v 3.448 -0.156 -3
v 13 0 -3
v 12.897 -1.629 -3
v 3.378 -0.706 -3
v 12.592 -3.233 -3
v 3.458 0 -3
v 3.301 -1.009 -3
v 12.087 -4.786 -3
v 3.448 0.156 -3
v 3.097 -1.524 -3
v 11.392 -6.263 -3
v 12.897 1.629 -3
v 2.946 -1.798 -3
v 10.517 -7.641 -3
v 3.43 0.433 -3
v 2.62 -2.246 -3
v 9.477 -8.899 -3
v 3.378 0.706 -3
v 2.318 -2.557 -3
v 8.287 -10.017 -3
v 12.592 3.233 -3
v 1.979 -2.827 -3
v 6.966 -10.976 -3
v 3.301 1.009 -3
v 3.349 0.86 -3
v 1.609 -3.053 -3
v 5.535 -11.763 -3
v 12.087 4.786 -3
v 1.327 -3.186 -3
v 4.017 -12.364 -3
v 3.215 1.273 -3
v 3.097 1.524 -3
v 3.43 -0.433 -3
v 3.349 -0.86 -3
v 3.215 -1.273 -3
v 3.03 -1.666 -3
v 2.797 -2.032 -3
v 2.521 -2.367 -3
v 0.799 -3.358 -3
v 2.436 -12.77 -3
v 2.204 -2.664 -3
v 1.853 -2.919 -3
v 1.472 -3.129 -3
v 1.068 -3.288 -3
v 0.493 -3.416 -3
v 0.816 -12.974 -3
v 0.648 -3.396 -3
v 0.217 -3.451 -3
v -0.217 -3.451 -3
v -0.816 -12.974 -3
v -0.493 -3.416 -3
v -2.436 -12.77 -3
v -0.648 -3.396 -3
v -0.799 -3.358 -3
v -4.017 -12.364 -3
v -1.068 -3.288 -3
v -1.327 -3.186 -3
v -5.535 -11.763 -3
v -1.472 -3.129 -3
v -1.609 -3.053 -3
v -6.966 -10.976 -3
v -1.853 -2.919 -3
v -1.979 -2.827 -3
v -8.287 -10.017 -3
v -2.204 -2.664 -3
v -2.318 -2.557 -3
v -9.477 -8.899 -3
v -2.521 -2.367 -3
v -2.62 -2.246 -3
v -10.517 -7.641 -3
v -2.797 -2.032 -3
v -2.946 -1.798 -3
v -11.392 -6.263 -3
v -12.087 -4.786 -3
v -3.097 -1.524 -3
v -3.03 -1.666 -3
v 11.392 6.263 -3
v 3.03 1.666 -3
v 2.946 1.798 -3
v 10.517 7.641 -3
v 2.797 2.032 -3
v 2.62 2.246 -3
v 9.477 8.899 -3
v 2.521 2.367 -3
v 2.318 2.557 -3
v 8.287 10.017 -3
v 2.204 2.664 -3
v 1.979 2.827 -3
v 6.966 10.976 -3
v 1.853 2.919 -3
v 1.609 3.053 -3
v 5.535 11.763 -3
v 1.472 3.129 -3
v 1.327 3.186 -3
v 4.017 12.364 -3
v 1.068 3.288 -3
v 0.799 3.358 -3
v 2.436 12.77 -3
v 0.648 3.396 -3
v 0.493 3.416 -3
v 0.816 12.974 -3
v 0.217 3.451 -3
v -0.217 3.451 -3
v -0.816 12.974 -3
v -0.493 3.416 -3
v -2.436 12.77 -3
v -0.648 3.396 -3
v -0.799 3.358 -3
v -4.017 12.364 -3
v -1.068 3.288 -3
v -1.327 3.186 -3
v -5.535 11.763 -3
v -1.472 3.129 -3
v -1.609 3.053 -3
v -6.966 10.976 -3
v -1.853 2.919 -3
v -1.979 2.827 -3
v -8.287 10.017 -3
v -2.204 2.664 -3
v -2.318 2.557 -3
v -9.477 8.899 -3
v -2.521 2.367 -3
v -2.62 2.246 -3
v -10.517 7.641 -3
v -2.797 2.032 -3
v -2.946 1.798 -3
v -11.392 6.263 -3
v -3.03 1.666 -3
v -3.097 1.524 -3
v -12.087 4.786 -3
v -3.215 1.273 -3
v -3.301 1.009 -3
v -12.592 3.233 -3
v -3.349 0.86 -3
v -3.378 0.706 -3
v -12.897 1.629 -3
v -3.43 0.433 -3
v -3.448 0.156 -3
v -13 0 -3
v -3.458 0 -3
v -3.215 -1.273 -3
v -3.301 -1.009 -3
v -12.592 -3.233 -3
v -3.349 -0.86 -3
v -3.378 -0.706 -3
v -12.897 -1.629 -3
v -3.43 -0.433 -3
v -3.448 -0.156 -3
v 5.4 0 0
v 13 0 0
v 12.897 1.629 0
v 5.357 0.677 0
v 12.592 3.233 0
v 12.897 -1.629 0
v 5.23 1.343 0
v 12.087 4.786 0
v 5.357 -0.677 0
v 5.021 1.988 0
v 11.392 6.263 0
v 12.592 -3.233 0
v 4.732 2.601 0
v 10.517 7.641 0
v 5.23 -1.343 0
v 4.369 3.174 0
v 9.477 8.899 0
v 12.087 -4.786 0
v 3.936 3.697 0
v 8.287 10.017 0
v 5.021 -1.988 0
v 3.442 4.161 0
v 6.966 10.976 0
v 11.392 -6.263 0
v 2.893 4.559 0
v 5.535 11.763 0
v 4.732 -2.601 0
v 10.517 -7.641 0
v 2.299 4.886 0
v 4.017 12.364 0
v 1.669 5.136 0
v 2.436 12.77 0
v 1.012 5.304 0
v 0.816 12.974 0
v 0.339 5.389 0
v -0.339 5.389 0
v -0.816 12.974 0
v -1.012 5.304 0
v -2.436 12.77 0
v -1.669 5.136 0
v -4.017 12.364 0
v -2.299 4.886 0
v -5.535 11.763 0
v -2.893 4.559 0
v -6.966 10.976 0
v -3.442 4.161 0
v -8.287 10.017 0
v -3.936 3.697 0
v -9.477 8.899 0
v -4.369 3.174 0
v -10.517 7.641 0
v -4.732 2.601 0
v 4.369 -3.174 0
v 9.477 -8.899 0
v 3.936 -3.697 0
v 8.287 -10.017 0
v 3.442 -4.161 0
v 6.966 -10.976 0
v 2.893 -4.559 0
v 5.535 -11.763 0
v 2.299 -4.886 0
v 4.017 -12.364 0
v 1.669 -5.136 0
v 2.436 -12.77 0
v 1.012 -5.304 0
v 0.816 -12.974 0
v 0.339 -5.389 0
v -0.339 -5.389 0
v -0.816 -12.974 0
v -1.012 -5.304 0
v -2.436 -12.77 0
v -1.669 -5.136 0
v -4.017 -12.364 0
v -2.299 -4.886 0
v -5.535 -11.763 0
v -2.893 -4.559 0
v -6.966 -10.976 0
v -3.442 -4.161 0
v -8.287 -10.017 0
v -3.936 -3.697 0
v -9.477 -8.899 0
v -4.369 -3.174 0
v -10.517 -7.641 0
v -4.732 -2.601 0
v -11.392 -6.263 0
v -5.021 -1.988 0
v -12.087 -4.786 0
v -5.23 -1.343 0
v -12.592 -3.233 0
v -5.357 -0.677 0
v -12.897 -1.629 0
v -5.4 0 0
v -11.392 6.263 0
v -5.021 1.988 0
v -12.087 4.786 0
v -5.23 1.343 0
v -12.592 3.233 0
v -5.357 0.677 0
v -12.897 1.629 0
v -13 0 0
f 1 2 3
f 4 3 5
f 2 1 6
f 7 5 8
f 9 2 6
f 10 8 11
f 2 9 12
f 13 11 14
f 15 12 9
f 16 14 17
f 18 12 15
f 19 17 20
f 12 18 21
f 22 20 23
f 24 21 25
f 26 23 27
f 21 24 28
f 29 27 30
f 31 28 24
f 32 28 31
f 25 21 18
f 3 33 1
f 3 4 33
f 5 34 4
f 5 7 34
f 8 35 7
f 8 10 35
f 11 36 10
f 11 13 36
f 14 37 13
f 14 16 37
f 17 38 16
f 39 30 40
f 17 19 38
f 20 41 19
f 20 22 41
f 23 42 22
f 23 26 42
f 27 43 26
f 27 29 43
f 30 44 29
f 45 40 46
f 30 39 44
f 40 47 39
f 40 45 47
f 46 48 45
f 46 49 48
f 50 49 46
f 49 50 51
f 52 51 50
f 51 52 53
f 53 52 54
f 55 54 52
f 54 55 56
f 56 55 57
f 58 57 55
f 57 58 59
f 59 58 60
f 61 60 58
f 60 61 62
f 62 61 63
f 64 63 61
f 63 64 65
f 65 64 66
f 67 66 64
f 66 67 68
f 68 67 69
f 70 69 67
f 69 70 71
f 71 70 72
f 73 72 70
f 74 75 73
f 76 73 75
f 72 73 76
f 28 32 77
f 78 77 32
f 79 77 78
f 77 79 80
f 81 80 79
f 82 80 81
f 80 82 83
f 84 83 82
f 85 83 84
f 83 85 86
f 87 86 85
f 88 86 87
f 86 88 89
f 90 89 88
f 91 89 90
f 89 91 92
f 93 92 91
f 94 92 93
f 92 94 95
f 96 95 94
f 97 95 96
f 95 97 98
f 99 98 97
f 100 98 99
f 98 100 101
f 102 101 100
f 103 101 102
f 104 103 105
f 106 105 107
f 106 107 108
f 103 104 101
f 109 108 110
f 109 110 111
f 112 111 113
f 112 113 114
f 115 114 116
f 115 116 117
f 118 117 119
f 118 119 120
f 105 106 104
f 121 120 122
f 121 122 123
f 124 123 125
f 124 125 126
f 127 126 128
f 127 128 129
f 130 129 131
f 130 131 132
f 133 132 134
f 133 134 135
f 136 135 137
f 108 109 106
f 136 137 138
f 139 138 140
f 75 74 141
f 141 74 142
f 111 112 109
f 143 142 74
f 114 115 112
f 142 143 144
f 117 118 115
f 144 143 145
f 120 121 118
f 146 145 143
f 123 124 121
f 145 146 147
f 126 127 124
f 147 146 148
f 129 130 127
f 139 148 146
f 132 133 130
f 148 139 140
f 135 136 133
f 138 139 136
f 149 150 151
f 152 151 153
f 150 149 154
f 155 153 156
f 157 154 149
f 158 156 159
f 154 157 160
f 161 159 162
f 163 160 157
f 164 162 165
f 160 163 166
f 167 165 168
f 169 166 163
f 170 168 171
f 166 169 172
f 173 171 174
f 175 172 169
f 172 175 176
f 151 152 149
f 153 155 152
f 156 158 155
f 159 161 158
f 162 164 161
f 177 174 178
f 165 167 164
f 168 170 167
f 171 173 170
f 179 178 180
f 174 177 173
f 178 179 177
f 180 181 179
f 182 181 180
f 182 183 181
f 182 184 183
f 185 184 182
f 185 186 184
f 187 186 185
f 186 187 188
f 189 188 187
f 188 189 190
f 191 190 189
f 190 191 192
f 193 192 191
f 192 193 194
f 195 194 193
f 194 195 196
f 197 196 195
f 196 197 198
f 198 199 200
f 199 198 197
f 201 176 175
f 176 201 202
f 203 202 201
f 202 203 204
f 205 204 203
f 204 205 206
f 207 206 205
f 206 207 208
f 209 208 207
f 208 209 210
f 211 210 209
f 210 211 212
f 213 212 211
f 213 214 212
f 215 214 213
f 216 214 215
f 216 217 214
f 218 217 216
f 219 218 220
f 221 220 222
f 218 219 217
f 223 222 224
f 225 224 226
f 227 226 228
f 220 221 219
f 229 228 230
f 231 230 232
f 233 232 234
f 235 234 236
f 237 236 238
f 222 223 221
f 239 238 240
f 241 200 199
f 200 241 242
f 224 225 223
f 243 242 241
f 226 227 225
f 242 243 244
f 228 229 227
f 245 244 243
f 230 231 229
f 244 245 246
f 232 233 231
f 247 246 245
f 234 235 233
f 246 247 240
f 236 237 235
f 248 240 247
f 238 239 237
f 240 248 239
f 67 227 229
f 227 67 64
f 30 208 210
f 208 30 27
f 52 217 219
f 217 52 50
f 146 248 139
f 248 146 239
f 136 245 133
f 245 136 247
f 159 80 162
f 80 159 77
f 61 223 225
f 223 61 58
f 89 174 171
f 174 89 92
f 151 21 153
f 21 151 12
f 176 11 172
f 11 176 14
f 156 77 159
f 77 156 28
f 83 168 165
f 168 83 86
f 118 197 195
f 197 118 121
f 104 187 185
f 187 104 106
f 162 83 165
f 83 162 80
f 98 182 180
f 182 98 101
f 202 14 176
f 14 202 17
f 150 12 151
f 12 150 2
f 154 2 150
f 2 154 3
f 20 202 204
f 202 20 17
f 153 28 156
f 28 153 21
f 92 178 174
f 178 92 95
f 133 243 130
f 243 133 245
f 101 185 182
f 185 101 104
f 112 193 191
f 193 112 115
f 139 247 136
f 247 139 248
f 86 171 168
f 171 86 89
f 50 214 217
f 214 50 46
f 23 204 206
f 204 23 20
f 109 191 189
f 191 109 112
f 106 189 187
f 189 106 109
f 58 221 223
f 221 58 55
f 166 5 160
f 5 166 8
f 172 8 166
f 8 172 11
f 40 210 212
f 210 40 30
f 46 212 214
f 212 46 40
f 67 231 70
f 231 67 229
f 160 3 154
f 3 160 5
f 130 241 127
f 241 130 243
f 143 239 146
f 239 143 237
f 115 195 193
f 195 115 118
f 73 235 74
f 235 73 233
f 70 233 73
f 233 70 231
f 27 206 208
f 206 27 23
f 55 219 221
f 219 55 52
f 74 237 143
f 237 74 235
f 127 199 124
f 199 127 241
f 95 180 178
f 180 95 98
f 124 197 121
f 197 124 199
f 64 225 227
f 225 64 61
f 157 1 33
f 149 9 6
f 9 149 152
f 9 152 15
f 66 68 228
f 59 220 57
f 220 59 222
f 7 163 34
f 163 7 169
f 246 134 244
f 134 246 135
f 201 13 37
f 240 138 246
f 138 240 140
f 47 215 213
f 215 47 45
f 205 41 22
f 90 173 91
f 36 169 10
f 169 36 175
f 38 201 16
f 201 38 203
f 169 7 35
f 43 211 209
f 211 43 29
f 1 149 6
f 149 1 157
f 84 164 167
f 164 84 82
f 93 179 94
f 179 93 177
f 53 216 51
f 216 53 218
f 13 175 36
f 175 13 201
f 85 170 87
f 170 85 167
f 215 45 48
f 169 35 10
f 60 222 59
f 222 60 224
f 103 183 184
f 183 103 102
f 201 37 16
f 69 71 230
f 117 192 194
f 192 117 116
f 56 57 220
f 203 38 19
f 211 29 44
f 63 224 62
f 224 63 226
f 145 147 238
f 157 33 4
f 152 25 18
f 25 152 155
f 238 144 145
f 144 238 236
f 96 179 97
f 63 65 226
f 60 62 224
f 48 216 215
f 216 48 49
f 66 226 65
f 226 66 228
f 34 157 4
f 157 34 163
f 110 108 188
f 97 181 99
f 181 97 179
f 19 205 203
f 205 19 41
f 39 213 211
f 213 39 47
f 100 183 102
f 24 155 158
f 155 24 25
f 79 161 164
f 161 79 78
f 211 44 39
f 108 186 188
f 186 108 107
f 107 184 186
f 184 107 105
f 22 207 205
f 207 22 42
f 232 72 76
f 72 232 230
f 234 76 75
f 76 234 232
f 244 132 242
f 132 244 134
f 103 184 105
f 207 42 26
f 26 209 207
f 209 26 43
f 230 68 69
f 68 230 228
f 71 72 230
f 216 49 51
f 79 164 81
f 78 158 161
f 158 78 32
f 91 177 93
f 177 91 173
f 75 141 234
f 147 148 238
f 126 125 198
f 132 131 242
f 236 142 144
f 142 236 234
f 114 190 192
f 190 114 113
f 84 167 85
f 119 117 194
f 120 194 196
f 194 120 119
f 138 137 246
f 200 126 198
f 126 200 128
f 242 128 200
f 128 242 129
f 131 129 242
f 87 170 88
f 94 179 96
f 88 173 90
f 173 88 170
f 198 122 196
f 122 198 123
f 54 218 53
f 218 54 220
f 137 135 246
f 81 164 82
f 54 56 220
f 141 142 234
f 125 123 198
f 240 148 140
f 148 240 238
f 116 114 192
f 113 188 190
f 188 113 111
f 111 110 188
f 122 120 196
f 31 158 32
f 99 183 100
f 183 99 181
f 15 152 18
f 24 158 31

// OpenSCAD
$fn = 50;


difference() {
	union() {
		translate(v = [0, 0, -3.0000000000]) {
			cylinder(h = 3, r = 7.0000000000);
		}
		translate(v = [0, 0, -3.0000000000]) {
			cylinder(h = 3, r = 13.0000000000);
		}
	}
	union() {
		translate(v = [0, 0, 0]) {
			rotate(a = [0, 0, 0]) {
				difference() {
					union() {
						#translate(v = [0, 0, -3.0000000000]) {
							cylinder(h = 3, r = 2.6000000000);
						}
						#translate(v = [0, 0, -3.9000000000]) {
							cylinder(h = 3.9000000000, r1 = 2.8750000000, r2 = 5.4000000000);
						}
						#translate(v = [0, 0, -3.0000000000]) {
							cylinder(h = 3, r = 2.8750000000);
						}
						#translate(v = [0, 0, -3.0000000000]) {
							cylinder(h = 3, r = 2.6000000000);
						}
					}
					union();
				}
			}
		}
	}
}
